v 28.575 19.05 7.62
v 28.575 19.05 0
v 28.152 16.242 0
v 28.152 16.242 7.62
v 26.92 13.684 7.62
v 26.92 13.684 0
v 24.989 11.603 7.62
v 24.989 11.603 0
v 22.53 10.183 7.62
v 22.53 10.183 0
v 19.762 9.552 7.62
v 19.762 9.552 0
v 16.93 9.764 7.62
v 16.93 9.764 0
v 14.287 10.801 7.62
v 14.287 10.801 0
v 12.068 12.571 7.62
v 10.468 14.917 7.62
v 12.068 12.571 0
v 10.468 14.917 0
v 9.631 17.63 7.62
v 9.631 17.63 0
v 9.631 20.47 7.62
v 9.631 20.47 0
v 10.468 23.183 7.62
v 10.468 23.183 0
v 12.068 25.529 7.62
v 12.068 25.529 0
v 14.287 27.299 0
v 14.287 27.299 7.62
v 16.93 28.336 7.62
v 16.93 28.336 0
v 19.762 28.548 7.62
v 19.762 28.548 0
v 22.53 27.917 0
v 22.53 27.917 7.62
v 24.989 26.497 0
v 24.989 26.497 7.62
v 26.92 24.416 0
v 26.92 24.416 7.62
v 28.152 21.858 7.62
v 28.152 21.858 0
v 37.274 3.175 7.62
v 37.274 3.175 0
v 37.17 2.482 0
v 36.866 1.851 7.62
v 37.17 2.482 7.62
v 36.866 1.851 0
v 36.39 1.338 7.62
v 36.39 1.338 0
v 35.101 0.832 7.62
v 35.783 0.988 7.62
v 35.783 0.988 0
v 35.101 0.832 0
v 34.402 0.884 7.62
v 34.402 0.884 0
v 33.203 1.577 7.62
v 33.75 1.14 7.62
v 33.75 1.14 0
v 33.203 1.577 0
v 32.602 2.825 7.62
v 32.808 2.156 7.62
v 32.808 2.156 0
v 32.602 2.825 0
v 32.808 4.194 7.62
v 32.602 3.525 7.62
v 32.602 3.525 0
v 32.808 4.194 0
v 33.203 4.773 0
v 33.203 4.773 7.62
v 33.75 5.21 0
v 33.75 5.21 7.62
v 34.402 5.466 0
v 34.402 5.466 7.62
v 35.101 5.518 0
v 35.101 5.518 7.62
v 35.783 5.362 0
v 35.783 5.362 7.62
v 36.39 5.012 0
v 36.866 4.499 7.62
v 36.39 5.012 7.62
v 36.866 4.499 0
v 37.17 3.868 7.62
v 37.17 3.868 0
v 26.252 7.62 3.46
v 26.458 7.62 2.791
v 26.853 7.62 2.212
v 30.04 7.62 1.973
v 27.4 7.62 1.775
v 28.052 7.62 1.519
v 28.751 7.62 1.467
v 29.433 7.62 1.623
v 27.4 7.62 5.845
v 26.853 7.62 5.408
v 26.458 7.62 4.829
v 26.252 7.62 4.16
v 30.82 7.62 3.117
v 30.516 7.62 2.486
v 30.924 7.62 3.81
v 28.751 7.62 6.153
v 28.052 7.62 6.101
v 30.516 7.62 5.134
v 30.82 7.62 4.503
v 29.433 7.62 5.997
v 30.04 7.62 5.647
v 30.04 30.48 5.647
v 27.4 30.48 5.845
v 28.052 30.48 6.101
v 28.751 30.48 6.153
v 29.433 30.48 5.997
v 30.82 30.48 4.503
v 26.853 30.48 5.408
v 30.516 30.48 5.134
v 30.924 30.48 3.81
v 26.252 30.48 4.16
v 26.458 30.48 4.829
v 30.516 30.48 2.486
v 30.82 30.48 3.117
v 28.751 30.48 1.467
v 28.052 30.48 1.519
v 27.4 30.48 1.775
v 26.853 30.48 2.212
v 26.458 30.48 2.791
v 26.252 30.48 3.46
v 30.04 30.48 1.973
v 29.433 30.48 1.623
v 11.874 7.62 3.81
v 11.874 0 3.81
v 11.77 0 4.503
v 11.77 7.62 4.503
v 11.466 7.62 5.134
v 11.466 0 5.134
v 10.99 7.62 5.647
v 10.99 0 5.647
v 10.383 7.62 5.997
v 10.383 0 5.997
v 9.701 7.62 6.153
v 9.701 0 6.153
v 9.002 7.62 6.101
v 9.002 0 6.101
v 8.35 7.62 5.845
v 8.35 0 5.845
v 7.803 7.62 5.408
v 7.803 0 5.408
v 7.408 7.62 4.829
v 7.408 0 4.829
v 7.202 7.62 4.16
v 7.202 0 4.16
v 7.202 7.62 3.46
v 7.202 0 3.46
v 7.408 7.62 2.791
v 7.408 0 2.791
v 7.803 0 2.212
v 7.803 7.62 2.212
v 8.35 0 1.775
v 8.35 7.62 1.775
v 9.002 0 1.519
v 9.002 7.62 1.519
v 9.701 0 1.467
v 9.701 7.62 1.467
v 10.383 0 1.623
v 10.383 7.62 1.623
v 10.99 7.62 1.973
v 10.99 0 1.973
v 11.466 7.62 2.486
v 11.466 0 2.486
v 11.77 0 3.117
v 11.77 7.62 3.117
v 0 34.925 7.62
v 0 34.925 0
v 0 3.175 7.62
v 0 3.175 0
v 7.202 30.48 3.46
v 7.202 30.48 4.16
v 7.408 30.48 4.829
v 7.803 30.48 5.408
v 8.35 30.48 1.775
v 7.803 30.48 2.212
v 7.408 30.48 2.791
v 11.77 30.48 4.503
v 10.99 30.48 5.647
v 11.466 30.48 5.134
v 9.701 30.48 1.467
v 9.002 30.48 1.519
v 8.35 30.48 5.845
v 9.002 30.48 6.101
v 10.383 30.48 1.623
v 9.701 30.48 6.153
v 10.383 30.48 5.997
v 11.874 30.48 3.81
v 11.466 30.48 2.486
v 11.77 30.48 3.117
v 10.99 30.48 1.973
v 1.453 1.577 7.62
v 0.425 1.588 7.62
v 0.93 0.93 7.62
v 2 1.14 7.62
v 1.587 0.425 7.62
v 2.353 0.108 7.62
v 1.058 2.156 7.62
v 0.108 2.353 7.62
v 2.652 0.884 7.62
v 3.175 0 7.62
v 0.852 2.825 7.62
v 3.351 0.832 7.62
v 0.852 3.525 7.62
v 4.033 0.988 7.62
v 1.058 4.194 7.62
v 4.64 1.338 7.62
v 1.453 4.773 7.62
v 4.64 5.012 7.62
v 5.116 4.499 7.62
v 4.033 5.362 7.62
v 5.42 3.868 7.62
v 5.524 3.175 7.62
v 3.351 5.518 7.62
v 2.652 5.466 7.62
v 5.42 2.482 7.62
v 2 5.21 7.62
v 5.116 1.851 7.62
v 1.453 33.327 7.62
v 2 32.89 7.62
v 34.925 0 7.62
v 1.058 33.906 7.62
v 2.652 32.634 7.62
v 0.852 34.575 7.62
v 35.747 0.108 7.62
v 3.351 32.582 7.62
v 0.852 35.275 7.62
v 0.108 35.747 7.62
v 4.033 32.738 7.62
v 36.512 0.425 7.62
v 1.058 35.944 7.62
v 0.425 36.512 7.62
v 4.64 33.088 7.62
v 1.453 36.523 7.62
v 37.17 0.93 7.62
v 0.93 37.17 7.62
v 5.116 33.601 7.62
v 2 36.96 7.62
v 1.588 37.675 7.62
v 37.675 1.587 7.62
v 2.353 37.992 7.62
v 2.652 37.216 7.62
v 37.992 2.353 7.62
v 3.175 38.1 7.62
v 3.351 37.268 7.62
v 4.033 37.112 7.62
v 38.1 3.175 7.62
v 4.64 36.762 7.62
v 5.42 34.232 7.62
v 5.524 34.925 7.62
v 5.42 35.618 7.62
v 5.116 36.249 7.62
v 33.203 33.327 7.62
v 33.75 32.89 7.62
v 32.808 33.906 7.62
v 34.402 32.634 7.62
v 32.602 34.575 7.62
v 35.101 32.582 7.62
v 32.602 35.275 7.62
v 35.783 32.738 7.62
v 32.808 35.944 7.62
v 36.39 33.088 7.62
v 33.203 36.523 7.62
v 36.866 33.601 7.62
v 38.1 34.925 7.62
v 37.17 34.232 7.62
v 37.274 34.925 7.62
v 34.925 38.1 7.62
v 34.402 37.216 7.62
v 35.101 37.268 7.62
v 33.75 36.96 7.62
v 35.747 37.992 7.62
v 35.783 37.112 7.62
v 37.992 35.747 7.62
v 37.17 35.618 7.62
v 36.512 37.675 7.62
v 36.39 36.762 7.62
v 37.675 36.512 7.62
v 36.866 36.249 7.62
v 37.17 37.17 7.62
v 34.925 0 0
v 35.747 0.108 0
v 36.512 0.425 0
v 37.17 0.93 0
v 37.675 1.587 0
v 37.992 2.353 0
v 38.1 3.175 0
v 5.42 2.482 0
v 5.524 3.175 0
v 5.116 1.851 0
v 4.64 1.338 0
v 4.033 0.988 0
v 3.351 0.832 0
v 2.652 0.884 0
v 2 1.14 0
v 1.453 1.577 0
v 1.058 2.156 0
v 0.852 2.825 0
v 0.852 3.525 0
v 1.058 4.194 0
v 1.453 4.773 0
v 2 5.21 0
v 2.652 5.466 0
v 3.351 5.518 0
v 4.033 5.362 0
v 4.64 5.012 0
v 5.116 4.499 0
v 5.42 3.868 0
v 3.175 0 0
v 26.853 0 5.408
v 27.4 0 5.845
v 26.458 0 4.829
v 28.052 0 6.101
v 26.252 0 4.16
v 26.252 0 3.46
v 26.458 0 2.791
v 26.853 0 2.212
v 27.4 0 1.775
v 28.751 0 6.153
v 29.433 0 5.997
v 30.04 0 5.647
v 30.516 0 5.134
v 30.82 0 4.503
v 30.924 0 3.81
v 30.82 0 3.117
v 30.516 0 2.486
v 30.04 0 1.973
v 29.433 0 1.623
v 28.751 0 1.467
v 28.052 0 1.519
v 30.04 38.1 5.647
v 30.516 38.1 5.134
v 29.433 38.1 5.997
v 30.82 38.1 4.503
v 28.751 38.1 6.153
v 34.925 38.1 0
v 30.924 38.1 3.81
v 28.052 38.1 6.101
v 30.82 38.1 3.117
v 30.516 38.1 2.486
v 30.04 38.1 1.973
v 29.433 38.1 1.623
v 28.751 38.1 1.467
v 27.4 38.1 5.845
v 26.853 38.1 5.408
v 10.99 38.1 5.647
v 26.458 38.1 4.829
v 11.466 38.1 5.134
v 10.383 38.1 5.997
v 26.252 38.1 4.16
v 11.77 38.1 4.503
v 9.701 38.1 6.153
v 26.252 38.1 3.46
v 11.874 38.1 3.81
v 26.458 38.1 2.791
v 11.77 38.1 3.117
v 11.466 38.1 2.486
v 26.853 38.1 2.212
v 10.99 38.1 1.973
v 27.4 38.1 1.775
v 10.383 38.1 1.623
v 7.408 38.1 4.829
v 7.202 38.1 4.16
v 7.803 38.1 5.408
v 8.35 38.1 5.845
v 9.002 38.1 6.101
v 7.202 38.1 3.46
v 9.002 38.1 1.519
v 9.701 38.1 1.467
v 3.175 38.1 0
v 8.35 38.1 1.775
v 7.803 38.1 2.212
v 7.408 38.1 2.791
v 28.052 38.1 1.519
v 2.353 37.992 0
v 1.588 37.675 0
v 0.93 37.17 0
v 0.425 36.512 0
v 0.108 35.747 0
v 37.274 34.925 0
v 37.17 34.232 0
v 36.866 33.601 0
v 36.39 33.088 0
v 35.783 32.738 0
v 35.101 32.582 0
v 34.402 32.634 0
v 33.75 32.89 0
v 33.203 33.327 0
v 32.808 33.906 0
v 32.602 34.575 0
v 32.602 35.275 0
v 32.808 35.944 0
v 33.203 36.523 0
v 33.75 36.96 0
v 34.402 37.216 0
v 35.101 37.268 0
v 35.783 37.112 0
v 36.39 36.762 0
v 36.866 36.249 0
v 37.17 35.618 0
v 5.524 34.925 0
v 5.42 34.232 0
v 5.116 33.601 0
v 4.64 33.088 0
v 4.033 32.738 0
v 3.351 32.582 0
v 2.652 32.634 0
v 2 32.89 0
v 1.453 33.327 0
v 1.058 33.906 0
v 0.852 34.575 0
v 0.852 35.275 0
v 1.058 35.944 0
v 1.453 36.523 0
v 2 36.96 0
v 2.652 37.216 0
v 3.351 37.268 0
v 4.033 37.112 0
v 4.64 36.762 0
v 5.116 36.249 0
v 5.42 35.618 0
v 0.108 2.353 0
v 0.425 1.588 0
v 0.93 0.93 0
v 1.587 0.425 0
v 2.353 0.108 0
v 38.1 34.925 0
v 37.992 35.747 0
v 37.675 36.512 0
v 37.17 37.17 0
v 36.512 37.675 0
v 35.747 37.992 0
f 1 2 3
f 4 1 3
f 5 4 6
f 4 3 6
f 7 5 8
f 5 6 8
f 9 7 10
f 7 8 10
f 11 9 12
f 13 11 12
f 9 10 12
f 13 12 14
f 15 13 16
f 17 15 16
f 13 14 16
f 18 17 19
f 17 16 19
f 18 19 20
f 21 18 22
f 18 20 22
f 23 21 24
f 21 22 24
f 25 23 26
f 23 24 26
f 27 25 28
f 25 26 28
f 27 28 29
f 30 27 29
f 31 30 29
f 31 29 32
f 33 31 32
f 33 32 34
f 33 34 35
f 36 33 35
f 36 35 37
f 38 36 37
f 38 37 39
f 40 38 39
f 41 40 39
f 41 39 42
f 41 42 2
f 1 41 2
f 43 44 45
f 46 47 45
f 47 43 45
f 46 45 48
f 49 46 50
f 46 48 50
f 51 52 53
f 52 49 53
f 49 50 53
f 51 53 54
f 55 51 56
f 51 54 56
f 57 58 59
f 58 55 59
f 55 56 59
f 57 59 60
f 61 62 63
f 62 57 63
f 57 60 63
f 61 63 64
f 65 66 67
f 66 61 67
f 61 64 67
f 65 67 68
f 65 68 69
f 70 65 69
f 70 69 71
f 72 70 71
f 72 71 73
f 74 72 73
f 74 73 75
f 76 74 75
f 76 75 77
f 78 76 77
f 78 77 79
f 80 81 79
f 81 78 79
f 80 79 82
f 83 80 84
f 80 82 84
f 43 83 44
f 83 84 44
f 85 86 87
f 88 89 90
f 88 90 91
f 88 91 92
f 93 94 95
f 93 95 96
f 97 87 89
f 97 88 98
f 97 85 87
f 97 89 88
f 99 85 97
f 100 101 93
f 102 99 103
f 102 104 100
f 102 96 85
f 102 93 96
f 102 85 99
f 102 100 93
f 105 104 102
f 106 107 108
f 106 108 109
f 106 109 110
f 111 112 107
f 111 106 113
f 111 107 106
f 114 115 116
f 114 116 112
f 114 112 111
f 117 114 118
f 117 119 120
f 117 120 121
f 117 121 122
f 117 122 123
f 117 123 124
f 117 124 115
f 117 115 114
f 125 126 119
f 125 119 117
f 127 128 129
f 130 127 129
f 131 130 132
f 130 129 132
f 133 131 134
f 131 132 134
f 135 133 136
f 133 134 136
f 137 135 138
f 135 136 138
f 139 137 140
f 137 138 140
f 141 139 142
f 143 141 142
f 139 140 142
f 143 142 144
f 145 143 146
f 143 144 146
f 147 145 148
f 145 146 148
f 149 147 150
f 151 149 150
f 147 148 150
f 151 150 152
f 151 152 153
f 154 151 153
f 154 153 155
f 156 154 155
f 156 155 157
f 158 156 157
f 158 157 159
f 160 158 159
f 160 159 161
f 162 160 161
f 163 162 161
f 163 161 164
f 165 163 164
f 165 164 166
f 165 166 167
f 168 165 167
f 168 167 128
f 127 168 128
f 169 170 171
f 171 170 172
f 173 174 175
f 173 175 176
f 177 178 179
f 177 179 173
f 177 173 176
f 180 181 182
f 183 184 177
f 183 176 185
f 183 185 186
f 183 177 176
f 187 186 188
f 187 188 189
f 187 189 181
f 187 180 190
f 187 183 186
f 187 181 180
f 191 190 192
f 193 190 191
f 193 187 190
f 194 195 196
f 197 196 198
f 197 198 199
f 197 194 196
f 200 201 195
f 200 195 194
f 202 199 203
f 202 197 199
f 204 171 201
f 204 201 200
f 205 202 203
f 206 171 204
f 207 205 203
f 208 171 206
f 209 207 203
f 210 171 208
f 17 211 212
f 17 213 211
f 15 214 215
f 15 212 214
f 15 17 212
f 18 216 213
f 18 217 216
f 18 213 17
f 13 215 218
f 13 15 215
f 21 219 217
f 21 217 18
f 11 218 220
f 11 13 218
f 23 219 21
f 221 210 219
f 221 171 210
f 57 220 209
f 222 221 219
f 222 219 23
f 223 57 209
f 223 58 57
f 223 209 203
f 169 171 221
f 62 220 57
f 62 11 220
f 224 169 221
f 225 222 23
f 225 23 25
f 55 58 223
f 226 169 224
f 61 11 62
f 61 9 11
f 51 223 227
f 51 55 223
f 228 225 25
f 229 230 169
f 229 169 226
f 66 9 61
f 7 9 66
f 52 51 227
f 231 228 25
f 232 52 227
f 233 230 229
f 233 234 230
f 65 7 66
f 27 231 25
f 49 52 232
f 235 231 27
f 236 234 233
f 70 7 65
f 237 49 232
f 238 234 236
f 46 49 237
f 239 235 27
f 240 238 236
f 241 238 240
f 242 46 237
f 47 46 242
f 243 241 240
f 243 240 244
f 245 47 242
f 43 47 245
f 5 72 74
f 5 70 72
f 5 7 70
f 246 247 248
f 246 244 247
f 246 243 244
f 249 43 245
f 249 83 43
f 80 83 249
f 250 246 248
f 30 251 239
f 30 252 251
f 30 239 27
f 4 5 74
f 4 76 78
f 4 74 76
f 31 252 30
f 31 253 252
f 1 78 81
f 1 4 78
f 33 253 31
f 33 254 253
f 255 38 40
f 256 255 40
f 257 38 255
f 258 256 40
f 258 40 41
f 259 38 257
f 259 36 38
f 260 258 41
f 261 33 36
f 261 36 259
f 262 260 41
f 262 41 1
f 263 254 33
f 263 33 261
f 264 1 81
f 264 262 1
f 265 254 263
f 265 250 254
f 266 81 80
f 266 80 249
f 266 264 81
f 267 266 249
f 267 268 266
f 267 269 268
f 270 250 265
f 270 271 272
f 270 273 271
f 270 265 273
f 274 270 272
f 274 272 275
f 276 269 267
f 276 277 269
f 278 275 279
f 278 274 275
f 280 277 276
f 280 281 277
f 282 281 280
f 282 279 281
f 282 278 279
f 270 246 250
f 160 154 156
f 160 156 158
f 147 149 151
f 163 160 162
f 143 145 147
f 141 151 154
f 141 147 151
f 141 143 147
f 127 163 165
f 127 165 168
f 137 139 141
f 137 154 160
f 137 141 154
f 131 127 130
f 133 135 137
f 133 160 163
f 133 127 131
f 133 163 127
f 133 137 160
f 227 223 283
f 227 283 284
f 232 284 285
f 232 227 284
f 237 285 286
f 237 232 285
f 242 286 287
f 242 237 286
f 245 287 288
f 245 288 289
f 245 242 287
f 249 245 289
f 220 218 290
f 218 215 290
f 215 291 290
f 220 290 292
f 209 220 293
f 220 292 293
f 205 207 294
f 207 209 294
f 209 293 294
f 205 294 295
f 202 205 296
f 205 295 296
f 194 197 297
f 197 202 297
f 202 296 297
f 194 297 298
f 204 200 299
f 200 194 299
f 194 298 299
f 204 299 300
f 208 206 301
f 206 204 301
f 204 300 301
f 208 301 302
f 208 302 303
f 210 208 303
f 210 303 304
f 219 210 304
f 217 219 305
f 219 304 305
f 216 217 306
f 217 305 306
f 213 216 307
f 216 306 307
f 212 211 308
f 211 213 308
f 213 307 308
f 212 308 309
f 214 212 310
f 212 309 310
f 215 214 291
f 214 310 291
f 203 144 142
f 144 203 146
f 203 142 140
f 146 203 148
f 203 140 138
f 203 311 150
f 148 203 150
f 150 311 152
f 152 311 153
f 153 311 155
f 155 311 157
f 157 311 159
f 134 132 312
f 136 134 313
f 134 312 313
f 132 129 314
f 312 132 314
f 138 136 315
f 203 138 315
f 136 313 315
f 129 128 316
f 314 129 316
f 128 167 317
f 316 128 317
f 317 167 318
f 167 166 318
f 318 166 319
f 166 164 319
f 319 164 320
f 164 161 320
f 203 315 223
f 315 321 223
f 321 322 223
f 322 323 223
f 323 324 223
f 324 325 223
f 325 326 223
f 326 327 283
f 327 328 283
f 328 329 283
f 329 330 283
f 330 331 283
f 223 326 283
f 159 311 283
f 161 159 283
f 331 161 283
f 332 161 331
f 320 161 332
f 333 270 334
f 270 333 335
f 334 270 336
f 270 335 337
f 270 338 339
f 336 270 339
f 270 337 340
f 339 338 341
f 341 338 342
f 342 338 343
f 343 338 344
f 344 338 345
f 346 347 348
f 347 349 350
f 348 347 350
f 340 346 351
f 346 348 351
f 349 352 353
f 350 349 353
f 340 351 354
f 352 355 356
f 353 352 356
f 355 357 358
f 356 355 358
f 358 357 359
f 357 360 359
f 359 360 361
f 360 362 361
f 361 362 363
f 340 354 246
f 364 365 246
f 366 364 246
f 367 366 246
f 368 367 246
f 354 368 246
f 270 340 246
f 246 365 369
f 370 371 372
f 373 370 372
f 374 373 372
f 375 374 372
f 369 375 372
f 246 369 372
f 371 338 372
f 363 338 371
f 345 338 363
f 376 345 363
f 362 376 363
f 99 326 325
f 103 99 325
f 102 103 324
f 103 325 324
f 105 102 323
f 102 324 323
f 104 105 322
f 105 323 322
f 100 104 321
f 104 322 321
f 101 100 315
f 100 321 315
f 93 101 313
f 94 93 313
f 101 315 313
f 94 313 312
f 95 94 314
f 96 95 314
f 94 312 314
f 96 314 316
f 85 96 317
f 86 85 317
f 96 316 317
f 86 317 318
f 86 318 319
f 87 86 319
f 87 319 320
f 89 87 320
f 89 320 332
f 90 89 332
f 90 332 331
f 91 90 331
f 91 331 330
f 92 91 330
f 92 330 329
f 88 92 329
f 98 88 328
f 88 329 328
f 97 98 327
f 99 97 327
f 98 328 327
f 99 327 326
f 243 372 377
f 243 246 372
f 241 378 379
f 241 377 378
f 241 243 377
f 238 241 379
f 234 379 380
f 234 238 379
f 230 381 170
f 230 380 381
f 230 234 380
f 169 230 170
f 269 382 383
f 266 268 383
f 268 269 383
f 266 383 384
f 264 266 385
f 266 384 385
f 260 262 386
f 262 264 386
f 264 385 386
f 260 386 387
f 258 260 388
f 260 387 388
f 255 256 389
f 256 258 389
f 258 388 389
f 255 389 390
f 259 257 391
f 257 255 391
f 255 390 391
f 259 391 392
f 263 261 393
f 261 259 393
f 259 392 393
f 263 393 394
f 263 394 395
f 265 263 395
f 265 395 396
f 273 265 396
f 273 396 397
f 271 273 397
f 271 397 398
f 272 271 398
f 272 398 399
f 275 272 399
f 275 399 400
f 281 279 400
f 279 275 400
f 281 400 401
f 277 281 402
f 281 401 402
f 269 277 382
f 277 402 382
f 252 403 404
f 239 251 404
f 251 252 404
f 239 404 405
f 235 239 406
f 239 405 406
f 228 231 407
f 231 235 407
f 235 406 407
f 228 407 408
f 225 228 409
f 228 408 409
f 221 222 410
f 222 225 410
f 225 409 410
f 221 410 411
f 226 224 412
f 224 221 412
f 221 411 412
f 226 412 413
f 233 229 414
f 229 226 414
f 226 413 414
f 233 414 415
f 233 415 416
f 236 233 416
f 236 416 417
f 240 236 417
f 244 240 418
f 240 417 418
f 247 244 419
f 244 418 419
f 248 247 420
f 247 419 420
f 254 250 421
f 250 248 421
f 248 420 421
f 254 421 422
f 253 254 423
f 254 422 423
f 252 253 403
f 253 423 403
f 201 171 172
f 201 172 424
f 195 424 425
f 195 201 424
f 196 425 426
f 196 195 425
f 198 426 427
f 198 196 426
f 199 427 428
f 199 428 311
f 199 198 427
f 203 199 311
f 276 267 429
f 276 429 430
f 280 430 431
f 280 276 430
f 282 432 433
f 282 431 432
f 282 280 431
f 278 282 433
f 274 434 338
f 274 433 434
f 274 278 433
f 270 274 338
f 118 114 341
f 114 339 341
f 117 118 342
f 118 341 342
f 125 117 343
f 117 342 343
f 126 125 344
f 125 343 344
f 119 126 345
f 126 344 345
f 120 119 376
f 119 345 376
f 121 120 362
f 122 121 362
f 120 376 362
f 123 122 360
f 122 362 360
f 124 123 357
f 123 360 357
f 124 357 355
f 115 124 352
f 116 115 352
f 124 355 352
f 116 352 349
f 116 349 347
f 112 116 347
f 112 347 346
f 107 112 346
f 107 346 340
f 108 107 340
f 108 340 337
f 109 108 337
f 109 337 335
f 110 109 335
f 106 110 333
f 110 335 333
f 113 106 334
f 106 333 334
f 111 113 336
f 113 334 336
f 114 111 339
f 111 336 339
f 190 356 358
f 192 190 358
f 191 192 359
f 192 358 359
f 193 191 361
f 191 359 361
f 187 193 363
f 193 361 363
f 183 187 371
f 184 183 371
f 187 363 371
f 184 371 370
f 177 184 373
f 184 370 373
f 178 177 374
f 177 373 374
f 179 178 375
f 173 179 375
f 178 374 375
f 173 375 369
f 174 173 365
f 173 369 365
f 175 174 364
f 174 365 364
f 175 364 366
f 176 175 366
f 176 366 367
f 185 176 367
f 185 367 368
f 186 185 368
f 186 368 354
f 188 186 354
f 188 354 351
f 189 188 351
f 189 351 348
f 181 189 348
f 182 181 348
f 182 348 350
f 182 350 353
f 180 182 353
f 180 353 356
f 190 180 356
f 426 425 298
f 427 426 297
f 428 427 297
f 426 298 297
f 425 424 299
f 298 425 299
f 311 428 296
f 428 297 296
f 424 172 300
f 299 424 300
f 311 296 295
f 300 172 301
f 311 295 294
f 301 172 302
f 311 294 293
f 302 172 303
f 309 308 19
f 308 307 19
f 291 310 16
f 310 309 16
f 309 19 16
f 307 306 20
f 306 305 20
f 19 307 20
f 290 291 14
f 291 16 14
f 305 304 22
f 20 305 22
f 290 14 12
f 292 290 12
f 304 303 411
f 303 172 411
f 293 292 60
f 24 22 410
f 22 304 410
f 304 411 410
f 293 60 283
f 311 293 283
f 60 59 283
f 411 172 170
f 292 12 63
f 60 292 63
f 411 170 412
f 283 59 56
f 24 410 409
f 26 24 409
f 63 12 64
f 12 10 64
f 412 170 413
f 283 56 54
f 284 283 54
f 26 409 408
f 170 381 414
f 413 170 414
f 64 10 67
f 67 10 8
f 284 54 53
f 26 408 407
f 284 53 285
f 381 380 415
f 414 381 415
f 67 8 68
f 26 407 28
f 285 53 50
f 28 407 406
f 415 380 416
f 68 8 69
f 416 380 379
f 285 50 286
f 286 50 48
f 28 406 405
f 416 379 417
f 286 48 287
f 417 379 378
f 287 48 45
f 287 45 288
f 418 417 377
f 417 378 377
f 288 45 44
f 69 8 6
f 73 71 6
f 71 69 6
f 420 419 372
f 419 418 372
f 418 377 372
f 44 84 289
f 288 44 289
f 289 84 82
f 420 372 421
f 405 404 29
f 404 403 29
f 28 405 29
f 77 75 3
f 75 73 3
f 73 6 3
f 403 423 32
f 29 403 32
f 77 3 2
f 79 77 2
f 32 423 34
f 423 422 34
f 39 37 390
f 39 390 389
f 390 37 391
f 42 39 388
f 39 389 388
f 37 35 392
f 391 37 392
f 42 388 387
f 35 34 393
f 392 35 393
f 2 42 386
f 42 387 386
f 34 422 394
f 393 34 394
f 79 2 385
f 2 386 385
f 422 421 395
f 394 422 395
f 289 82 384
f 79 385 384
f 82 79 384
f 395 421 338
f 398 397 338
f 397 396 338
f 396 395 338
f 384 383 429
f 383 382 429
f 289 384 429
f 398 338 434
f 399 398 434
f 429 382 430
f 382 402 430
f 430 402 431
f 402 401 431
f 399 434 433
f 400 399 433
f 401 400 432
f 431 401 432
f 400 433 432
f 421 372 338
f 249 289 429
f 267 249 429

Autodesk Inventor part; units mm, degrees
ref_plane "YZ Plane" through (0, 0, 0) normal (1, 0, 0) x (0, 1, 0)
ref_plane "XZ Plane" through (0, 0, 0) normal (0, 1, 0) x (-1, 0, 0)
ref_plane "XY Plane" through (0, 0, 0) normal (0, 0, 1) x (1, 0, 0)
sketch "Sketch1" plane through (0, 0, 0) normal (0, 0, 1) x (1, 0, 0)
  line L0 (0, 0) -> (38.1, 0)
  line L1 (38.1, 0) -> (38.1, 38.1)
  line L2 (38.1, 38.1) -> (0, 38.1)
  line L3 (0, 38.1) -> (0, 0)
  circle A0 centre (3.175, 34.925) radius 2.3495
  circle A1 centre (34.925, 34.925) radius 2.3495
  circle A2 centre (3.175, 3.175) radius 2.3495
  circle A3 centre (34.925, 3.175) radius 2.3495
  line L4 (0, 19.05) -> (19.05, 19.05)
  circle A4 centre (19.05, 19.05) radius 9.525
  circle A5 centre (19.05, 19.05) radius 6.35
  line L5 (7.4295, 34.925) -> (7.4295, 38.1)
  line L6 (0, 30.6705) -> (3.175, 30.6705)
  arc A6 (3.175, 30.6705) -> (7.4295, 34.925) centre (3.175, 34.925) ccw
  line L7 (5.5245, 34.925) -> (7.4295, 34.925)
  line L8 (3.175, 7.4295) -> (0, 7.4295)
  line L9 (7.4295, 0) -> (7.4295, 3.175)
  arc A7 (7.4295, 3.175) -> (3.175, 7.4295) centre (3.175, 3.175) ccw
  line L10 (30.6705, 3.175) -> (30.6705, 0)
  line L11 (38.1, 7.4295) -> (34.925, 7.4295)
  arc A8 (34.925, 7.4295) -> (30.6705, 3.175) centre (34.925, 3.175) ccw
  line L12 (34.925, 30.6705) -> (38.1, 30.6705)
  line L13 (30.6705, 38.1) -> (30.6705, 34.925)
  arc A9 (30.6705, 34.925) -> (34.925, 30.6705) centre (34.925, 34.925) ccw
  line L14 (0, 7.4295) -> (0, 0)
  line L15 (0, 0) -> (7.4295, 0)
  line L16 (30.6705, 0) -> (38.1, 0)
  line L17 (38.1, 0) -> (38.1, 7.4295)
  line L18 (30.6705, 38.1) -> (38.1, 38.1)
  line L19 (38.1, 38.1) -> (38.1, 30.6705)
  dimension "d2" = 4.699
  dimension "d0" = 38.1
  dimension "d1" = 38.1
  dimension "d5" = 31.75
  dimension "d8" = 31.75
  dimension "d11" = 3.175
  dimension "d12" = 3.175
  dimension "d13" = 19.05
  dimension "d14" = 19.05
  dimension "d15" = 12.7
  dimension "d16" = 3.175
  dimension "d17" = 3.175
  dimension "d18" = 1.905
  dimension "d24" = 360
extrude "Extrusion1" add sketch "Sketch1" along normal blind 7.62 contours L3 L8 A7 L9 L0 | L9 A7 L8 L3 L6 A6 L5 L2 L13 A9 L12 L1 L11 A8 L10 L0 | L10 A8 L11 L1 L0 | L3 L2 L5 A6 L6 | L12 A9 L13 L2 L1
fillet "Fillet1" radius 3.175 4 edges at (0, 38.1, 3.81) (38.1, 38.1, 3.81) (0, 0, 3.81) (38.1, 0, 3.81)
sketch "Sketch2" plane through (3.175, 38.1, 0) normal (0, 1, 0) x (1, 0, 0)
  line L0 (31.75, 0) -> (0, 0) projected
  line L1 (0, -7.62) -> (31.75, -7.62) projected
  line L2 (15.875, 0) -> (15.875, -3.81)
  line L3 (15.875, -3.81) -> (25.4, -3.81)
  line L4 (15.875, -3.81) -> (6.35, -3.81)
  circle A0 centre (25.4, -3.81) radius 2.3495
  circle A1 centre (6.35, -3.81) radius 2.3495
  point P0 (-3.175, 0)
  dimension "d29" = 3.81
  dimension "d30" = 9.525
  dimension "d31" = 9.525
  dimension "d32" = 4.699
  dimension "d33" = 4.699
extrude "Extrusion2" cut sketch "Sketch2" against normal blind 7.62
sketch "Sketch3" plane through (3.175, 0, 0) normal (0, -1, 0) x (1, 0, 0)
  line L0 (0, 0) -> (31.75, 0) projected
  line L1 (15.875, 0) -> (15.875, 3.81)
  line L2 (15.875, 3.81) -> (6.35, 3.81)
  line L3 (15.875, 3.81) -> (25.4, 3.81)
  circle A0 centre (6.35, 3.81) radius 2.3495
  circle A1 centre (25.4, 3.81) radius 2.3495
  point P0 (-3.175, 0)
  dimension "d36" = 3.81
  dimension "d37" = 9.525
  dimension "d38" = 9.525
  dimension "d39" = 4.699
  dimension "d40" = 4.699
extrude "Extrusion3" cut sketch "Sketch3" against normal blind 7.62
thread "Thread1" size "10-32 UNF" class "2B" standard "ANSI Unified Screw Threads" full length
thread "Thread2" size "10-32 UNF" class "2B" standard "ANSI Unified Screw Threads" full length
thread "Thread3" size "10-32 UNF" class "2B" standard "ANSI Unified Screw Threads" full length
thread "Thread4" size "10-32 UNF" class "2B" standard "ANSI Unified Screw Threads" full length
thread "Thread5" size "10-32 UNF" class "2B" standard "ANSI Unified Screw Threads" full length
thread "Thread6" size "10-32 UNF" class "2B" standard "ANSI Unified Screw Threads" full length
thread "Thread7" size "10-32 UNF" class "2B" standard "ANSI Unified Screw Threads" full length
thread "Thread8" size "10-32 UNF" class "2B" standard "ANSI Unified Screw Threads" full length
equation "\"d16\" = d11"
equation "\"d17\" = d11"
properties part number "Gearbox End Plate 2"
